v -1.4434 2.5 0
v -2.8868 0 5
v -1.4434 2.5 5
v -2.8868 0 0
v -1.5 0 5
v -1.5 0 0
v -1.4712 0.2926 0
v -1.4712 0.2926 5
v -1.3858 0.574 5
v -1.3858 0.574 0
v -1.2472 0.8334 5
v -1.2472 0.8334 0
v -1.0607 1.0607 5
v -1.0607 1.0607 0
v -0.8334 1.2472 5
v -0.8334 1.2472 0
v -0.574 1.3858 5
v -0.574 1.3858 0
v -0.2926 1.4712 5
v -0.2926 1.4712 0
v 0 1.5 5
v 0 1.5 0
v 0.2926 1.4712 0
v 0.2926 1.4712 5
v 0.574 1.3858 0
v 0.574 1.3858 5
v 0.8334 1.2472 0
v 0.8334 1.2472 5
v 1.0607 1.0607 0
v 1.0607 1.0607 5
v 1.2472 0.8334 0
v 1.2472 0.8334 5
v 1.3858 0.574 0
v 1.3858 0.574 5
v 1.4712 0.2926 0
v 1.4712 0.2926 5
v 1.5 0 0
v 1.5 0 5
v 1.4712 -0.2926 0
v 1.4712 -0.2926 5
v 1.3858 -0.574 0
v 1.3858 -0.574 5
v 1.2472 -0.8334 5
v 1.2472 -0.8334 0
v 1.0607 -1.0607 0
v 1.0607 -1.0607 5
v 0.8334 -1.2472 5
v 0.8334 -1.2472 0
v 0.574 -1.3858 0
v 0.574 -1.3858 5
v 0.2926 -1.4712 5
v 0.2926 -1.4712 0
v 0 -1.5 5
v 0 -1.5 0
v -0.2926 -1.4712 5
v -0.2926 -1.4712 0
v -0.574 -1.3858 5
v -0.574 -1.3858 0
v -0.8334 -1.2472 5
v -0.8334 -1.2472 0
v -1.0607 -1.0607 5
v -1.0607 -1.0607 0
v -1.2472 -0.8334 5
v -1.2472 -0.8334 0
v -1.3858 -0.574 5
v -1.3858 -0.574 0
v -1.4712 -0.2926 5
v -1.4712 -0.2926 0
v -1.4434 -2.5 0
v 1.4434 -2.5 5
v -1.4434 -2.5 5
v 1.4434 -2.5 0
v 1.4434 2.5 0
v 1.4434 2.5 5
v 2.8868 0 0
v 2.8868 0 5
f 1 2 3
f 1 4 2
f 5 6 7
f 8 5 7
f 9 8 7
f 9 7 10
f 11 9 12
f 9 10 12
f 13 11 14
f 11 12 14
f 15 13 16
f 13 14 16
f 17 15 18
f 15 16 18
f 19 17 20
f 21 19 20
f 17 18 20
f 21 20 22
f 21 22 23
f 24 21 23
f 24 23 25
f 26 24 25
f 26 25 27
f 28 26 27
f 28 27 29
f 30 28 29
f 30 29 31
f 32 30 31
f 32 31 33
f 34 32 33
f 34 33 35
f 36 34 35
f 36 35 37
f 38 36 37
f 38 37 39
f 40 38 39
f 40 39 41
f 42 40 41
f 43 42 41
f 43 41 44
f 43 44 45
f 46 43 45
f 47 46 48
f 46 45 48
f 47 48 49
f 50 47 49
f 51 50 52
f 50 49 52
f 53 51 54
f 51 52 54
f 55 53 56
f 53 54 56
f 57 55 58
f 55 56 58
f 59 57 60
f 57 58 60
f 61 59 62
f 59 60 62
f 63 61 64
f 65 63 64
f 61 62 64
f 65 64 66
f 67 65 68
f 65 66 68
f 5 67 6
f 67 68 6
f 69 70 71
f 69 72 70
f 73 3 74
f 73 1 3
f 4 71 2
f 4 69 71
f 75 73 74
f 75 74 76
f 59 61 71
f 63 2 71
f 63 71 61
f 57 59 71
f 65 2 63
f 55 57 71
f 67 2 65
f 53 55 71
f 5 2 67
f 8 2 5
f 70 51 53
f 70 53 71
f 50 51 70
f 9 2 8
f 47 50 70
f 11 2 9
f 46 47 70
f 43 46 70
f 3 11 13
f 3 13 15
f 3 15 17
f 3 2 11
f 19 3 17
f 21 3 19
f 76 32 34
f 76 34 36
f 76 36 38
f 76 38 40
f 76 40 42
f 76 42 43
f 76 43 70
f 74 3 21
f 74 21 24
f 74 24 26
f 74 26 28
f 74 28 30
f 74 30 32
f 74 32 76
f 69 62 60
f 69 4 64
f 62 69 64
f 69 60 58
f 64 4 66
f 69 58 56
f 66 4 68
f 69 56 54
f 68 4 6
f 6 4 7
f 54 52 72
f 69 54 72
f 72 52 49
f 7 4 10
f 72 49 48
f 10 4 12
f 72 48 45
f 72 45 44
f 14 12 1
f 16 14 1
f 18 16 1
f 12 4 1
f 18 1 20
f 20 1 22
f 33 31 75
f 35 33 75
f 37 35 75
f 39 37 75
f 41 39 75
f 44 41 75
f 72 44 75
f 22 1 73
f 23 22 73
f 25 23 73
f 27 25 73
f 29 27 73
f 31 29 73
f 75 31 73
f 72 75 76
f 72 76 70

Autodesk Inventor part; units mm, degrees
ref_plane "YZ Plane" through (0, 0, 0) normal (1, 0, 0) x (0, 1, 0)
ref_plane "XZ Plane" through (0, 0, 0) normal (0, 1, 0) x (-1, 0, 0)
ref_plane "XY Plane" through (0, 0, 0) normal (0, 0, 1) x (1, 0, 0)
sketch "Sketch1" plane through (0, 0, 0) normal (0, 0, 1) x (1, 0, 0)
  line L0 (2.8868, 0) -> (1.4434, -2.5)
  line L1 (1.4434, -2.5) -> (-1.4434, -2.5)
  line L2 (-1.4434, -2.5) -> (-2.8868, 0)
  line L3 (-2.8868, 0) -> (-1.4434, 2.5)
  line L4 (-1.4434, 2.5) -> (1.4434, 2.5)
  line L5 (1.4434, 2.5) -> (2.8868, 0)
  point P0 (0, 0)
  point P1 (0, 0)
  dimension "d0" = 5
extrude "Extrusion1" add sketch "Sketch1" along normal blind 5
sketch "Sketch2" plane through (0, 0, 5) normal (0, 0, 1) x (1, 0, 0)
  circle A0 centre (0, 0) radius 1.5
  dimension "d3" = 3
extrude "Extrusion2" add sketch "Sketch2" along normal blind 6
sketch "Sketch3" plane through (0, 0, 0) normal (0, 0, -1) x (-1, 0, 0)
  circle A0 centre (0, 0) radius 1.5
  dimension "d6" = 3
extrude "Extrusion3" cut sketch "Sketch3" against normal blind 4
sketch "Sketch4" plane through (0, 0, 4) normal (0, 0, -1) x (-1, 0, 0)
  circle A0 centre (0, 0) radius 1.5 projected
extrude "Extrusion4" cut sketch "Sketch4" against normal through all
properties part number "Spacer5mm_m3_970050351"
